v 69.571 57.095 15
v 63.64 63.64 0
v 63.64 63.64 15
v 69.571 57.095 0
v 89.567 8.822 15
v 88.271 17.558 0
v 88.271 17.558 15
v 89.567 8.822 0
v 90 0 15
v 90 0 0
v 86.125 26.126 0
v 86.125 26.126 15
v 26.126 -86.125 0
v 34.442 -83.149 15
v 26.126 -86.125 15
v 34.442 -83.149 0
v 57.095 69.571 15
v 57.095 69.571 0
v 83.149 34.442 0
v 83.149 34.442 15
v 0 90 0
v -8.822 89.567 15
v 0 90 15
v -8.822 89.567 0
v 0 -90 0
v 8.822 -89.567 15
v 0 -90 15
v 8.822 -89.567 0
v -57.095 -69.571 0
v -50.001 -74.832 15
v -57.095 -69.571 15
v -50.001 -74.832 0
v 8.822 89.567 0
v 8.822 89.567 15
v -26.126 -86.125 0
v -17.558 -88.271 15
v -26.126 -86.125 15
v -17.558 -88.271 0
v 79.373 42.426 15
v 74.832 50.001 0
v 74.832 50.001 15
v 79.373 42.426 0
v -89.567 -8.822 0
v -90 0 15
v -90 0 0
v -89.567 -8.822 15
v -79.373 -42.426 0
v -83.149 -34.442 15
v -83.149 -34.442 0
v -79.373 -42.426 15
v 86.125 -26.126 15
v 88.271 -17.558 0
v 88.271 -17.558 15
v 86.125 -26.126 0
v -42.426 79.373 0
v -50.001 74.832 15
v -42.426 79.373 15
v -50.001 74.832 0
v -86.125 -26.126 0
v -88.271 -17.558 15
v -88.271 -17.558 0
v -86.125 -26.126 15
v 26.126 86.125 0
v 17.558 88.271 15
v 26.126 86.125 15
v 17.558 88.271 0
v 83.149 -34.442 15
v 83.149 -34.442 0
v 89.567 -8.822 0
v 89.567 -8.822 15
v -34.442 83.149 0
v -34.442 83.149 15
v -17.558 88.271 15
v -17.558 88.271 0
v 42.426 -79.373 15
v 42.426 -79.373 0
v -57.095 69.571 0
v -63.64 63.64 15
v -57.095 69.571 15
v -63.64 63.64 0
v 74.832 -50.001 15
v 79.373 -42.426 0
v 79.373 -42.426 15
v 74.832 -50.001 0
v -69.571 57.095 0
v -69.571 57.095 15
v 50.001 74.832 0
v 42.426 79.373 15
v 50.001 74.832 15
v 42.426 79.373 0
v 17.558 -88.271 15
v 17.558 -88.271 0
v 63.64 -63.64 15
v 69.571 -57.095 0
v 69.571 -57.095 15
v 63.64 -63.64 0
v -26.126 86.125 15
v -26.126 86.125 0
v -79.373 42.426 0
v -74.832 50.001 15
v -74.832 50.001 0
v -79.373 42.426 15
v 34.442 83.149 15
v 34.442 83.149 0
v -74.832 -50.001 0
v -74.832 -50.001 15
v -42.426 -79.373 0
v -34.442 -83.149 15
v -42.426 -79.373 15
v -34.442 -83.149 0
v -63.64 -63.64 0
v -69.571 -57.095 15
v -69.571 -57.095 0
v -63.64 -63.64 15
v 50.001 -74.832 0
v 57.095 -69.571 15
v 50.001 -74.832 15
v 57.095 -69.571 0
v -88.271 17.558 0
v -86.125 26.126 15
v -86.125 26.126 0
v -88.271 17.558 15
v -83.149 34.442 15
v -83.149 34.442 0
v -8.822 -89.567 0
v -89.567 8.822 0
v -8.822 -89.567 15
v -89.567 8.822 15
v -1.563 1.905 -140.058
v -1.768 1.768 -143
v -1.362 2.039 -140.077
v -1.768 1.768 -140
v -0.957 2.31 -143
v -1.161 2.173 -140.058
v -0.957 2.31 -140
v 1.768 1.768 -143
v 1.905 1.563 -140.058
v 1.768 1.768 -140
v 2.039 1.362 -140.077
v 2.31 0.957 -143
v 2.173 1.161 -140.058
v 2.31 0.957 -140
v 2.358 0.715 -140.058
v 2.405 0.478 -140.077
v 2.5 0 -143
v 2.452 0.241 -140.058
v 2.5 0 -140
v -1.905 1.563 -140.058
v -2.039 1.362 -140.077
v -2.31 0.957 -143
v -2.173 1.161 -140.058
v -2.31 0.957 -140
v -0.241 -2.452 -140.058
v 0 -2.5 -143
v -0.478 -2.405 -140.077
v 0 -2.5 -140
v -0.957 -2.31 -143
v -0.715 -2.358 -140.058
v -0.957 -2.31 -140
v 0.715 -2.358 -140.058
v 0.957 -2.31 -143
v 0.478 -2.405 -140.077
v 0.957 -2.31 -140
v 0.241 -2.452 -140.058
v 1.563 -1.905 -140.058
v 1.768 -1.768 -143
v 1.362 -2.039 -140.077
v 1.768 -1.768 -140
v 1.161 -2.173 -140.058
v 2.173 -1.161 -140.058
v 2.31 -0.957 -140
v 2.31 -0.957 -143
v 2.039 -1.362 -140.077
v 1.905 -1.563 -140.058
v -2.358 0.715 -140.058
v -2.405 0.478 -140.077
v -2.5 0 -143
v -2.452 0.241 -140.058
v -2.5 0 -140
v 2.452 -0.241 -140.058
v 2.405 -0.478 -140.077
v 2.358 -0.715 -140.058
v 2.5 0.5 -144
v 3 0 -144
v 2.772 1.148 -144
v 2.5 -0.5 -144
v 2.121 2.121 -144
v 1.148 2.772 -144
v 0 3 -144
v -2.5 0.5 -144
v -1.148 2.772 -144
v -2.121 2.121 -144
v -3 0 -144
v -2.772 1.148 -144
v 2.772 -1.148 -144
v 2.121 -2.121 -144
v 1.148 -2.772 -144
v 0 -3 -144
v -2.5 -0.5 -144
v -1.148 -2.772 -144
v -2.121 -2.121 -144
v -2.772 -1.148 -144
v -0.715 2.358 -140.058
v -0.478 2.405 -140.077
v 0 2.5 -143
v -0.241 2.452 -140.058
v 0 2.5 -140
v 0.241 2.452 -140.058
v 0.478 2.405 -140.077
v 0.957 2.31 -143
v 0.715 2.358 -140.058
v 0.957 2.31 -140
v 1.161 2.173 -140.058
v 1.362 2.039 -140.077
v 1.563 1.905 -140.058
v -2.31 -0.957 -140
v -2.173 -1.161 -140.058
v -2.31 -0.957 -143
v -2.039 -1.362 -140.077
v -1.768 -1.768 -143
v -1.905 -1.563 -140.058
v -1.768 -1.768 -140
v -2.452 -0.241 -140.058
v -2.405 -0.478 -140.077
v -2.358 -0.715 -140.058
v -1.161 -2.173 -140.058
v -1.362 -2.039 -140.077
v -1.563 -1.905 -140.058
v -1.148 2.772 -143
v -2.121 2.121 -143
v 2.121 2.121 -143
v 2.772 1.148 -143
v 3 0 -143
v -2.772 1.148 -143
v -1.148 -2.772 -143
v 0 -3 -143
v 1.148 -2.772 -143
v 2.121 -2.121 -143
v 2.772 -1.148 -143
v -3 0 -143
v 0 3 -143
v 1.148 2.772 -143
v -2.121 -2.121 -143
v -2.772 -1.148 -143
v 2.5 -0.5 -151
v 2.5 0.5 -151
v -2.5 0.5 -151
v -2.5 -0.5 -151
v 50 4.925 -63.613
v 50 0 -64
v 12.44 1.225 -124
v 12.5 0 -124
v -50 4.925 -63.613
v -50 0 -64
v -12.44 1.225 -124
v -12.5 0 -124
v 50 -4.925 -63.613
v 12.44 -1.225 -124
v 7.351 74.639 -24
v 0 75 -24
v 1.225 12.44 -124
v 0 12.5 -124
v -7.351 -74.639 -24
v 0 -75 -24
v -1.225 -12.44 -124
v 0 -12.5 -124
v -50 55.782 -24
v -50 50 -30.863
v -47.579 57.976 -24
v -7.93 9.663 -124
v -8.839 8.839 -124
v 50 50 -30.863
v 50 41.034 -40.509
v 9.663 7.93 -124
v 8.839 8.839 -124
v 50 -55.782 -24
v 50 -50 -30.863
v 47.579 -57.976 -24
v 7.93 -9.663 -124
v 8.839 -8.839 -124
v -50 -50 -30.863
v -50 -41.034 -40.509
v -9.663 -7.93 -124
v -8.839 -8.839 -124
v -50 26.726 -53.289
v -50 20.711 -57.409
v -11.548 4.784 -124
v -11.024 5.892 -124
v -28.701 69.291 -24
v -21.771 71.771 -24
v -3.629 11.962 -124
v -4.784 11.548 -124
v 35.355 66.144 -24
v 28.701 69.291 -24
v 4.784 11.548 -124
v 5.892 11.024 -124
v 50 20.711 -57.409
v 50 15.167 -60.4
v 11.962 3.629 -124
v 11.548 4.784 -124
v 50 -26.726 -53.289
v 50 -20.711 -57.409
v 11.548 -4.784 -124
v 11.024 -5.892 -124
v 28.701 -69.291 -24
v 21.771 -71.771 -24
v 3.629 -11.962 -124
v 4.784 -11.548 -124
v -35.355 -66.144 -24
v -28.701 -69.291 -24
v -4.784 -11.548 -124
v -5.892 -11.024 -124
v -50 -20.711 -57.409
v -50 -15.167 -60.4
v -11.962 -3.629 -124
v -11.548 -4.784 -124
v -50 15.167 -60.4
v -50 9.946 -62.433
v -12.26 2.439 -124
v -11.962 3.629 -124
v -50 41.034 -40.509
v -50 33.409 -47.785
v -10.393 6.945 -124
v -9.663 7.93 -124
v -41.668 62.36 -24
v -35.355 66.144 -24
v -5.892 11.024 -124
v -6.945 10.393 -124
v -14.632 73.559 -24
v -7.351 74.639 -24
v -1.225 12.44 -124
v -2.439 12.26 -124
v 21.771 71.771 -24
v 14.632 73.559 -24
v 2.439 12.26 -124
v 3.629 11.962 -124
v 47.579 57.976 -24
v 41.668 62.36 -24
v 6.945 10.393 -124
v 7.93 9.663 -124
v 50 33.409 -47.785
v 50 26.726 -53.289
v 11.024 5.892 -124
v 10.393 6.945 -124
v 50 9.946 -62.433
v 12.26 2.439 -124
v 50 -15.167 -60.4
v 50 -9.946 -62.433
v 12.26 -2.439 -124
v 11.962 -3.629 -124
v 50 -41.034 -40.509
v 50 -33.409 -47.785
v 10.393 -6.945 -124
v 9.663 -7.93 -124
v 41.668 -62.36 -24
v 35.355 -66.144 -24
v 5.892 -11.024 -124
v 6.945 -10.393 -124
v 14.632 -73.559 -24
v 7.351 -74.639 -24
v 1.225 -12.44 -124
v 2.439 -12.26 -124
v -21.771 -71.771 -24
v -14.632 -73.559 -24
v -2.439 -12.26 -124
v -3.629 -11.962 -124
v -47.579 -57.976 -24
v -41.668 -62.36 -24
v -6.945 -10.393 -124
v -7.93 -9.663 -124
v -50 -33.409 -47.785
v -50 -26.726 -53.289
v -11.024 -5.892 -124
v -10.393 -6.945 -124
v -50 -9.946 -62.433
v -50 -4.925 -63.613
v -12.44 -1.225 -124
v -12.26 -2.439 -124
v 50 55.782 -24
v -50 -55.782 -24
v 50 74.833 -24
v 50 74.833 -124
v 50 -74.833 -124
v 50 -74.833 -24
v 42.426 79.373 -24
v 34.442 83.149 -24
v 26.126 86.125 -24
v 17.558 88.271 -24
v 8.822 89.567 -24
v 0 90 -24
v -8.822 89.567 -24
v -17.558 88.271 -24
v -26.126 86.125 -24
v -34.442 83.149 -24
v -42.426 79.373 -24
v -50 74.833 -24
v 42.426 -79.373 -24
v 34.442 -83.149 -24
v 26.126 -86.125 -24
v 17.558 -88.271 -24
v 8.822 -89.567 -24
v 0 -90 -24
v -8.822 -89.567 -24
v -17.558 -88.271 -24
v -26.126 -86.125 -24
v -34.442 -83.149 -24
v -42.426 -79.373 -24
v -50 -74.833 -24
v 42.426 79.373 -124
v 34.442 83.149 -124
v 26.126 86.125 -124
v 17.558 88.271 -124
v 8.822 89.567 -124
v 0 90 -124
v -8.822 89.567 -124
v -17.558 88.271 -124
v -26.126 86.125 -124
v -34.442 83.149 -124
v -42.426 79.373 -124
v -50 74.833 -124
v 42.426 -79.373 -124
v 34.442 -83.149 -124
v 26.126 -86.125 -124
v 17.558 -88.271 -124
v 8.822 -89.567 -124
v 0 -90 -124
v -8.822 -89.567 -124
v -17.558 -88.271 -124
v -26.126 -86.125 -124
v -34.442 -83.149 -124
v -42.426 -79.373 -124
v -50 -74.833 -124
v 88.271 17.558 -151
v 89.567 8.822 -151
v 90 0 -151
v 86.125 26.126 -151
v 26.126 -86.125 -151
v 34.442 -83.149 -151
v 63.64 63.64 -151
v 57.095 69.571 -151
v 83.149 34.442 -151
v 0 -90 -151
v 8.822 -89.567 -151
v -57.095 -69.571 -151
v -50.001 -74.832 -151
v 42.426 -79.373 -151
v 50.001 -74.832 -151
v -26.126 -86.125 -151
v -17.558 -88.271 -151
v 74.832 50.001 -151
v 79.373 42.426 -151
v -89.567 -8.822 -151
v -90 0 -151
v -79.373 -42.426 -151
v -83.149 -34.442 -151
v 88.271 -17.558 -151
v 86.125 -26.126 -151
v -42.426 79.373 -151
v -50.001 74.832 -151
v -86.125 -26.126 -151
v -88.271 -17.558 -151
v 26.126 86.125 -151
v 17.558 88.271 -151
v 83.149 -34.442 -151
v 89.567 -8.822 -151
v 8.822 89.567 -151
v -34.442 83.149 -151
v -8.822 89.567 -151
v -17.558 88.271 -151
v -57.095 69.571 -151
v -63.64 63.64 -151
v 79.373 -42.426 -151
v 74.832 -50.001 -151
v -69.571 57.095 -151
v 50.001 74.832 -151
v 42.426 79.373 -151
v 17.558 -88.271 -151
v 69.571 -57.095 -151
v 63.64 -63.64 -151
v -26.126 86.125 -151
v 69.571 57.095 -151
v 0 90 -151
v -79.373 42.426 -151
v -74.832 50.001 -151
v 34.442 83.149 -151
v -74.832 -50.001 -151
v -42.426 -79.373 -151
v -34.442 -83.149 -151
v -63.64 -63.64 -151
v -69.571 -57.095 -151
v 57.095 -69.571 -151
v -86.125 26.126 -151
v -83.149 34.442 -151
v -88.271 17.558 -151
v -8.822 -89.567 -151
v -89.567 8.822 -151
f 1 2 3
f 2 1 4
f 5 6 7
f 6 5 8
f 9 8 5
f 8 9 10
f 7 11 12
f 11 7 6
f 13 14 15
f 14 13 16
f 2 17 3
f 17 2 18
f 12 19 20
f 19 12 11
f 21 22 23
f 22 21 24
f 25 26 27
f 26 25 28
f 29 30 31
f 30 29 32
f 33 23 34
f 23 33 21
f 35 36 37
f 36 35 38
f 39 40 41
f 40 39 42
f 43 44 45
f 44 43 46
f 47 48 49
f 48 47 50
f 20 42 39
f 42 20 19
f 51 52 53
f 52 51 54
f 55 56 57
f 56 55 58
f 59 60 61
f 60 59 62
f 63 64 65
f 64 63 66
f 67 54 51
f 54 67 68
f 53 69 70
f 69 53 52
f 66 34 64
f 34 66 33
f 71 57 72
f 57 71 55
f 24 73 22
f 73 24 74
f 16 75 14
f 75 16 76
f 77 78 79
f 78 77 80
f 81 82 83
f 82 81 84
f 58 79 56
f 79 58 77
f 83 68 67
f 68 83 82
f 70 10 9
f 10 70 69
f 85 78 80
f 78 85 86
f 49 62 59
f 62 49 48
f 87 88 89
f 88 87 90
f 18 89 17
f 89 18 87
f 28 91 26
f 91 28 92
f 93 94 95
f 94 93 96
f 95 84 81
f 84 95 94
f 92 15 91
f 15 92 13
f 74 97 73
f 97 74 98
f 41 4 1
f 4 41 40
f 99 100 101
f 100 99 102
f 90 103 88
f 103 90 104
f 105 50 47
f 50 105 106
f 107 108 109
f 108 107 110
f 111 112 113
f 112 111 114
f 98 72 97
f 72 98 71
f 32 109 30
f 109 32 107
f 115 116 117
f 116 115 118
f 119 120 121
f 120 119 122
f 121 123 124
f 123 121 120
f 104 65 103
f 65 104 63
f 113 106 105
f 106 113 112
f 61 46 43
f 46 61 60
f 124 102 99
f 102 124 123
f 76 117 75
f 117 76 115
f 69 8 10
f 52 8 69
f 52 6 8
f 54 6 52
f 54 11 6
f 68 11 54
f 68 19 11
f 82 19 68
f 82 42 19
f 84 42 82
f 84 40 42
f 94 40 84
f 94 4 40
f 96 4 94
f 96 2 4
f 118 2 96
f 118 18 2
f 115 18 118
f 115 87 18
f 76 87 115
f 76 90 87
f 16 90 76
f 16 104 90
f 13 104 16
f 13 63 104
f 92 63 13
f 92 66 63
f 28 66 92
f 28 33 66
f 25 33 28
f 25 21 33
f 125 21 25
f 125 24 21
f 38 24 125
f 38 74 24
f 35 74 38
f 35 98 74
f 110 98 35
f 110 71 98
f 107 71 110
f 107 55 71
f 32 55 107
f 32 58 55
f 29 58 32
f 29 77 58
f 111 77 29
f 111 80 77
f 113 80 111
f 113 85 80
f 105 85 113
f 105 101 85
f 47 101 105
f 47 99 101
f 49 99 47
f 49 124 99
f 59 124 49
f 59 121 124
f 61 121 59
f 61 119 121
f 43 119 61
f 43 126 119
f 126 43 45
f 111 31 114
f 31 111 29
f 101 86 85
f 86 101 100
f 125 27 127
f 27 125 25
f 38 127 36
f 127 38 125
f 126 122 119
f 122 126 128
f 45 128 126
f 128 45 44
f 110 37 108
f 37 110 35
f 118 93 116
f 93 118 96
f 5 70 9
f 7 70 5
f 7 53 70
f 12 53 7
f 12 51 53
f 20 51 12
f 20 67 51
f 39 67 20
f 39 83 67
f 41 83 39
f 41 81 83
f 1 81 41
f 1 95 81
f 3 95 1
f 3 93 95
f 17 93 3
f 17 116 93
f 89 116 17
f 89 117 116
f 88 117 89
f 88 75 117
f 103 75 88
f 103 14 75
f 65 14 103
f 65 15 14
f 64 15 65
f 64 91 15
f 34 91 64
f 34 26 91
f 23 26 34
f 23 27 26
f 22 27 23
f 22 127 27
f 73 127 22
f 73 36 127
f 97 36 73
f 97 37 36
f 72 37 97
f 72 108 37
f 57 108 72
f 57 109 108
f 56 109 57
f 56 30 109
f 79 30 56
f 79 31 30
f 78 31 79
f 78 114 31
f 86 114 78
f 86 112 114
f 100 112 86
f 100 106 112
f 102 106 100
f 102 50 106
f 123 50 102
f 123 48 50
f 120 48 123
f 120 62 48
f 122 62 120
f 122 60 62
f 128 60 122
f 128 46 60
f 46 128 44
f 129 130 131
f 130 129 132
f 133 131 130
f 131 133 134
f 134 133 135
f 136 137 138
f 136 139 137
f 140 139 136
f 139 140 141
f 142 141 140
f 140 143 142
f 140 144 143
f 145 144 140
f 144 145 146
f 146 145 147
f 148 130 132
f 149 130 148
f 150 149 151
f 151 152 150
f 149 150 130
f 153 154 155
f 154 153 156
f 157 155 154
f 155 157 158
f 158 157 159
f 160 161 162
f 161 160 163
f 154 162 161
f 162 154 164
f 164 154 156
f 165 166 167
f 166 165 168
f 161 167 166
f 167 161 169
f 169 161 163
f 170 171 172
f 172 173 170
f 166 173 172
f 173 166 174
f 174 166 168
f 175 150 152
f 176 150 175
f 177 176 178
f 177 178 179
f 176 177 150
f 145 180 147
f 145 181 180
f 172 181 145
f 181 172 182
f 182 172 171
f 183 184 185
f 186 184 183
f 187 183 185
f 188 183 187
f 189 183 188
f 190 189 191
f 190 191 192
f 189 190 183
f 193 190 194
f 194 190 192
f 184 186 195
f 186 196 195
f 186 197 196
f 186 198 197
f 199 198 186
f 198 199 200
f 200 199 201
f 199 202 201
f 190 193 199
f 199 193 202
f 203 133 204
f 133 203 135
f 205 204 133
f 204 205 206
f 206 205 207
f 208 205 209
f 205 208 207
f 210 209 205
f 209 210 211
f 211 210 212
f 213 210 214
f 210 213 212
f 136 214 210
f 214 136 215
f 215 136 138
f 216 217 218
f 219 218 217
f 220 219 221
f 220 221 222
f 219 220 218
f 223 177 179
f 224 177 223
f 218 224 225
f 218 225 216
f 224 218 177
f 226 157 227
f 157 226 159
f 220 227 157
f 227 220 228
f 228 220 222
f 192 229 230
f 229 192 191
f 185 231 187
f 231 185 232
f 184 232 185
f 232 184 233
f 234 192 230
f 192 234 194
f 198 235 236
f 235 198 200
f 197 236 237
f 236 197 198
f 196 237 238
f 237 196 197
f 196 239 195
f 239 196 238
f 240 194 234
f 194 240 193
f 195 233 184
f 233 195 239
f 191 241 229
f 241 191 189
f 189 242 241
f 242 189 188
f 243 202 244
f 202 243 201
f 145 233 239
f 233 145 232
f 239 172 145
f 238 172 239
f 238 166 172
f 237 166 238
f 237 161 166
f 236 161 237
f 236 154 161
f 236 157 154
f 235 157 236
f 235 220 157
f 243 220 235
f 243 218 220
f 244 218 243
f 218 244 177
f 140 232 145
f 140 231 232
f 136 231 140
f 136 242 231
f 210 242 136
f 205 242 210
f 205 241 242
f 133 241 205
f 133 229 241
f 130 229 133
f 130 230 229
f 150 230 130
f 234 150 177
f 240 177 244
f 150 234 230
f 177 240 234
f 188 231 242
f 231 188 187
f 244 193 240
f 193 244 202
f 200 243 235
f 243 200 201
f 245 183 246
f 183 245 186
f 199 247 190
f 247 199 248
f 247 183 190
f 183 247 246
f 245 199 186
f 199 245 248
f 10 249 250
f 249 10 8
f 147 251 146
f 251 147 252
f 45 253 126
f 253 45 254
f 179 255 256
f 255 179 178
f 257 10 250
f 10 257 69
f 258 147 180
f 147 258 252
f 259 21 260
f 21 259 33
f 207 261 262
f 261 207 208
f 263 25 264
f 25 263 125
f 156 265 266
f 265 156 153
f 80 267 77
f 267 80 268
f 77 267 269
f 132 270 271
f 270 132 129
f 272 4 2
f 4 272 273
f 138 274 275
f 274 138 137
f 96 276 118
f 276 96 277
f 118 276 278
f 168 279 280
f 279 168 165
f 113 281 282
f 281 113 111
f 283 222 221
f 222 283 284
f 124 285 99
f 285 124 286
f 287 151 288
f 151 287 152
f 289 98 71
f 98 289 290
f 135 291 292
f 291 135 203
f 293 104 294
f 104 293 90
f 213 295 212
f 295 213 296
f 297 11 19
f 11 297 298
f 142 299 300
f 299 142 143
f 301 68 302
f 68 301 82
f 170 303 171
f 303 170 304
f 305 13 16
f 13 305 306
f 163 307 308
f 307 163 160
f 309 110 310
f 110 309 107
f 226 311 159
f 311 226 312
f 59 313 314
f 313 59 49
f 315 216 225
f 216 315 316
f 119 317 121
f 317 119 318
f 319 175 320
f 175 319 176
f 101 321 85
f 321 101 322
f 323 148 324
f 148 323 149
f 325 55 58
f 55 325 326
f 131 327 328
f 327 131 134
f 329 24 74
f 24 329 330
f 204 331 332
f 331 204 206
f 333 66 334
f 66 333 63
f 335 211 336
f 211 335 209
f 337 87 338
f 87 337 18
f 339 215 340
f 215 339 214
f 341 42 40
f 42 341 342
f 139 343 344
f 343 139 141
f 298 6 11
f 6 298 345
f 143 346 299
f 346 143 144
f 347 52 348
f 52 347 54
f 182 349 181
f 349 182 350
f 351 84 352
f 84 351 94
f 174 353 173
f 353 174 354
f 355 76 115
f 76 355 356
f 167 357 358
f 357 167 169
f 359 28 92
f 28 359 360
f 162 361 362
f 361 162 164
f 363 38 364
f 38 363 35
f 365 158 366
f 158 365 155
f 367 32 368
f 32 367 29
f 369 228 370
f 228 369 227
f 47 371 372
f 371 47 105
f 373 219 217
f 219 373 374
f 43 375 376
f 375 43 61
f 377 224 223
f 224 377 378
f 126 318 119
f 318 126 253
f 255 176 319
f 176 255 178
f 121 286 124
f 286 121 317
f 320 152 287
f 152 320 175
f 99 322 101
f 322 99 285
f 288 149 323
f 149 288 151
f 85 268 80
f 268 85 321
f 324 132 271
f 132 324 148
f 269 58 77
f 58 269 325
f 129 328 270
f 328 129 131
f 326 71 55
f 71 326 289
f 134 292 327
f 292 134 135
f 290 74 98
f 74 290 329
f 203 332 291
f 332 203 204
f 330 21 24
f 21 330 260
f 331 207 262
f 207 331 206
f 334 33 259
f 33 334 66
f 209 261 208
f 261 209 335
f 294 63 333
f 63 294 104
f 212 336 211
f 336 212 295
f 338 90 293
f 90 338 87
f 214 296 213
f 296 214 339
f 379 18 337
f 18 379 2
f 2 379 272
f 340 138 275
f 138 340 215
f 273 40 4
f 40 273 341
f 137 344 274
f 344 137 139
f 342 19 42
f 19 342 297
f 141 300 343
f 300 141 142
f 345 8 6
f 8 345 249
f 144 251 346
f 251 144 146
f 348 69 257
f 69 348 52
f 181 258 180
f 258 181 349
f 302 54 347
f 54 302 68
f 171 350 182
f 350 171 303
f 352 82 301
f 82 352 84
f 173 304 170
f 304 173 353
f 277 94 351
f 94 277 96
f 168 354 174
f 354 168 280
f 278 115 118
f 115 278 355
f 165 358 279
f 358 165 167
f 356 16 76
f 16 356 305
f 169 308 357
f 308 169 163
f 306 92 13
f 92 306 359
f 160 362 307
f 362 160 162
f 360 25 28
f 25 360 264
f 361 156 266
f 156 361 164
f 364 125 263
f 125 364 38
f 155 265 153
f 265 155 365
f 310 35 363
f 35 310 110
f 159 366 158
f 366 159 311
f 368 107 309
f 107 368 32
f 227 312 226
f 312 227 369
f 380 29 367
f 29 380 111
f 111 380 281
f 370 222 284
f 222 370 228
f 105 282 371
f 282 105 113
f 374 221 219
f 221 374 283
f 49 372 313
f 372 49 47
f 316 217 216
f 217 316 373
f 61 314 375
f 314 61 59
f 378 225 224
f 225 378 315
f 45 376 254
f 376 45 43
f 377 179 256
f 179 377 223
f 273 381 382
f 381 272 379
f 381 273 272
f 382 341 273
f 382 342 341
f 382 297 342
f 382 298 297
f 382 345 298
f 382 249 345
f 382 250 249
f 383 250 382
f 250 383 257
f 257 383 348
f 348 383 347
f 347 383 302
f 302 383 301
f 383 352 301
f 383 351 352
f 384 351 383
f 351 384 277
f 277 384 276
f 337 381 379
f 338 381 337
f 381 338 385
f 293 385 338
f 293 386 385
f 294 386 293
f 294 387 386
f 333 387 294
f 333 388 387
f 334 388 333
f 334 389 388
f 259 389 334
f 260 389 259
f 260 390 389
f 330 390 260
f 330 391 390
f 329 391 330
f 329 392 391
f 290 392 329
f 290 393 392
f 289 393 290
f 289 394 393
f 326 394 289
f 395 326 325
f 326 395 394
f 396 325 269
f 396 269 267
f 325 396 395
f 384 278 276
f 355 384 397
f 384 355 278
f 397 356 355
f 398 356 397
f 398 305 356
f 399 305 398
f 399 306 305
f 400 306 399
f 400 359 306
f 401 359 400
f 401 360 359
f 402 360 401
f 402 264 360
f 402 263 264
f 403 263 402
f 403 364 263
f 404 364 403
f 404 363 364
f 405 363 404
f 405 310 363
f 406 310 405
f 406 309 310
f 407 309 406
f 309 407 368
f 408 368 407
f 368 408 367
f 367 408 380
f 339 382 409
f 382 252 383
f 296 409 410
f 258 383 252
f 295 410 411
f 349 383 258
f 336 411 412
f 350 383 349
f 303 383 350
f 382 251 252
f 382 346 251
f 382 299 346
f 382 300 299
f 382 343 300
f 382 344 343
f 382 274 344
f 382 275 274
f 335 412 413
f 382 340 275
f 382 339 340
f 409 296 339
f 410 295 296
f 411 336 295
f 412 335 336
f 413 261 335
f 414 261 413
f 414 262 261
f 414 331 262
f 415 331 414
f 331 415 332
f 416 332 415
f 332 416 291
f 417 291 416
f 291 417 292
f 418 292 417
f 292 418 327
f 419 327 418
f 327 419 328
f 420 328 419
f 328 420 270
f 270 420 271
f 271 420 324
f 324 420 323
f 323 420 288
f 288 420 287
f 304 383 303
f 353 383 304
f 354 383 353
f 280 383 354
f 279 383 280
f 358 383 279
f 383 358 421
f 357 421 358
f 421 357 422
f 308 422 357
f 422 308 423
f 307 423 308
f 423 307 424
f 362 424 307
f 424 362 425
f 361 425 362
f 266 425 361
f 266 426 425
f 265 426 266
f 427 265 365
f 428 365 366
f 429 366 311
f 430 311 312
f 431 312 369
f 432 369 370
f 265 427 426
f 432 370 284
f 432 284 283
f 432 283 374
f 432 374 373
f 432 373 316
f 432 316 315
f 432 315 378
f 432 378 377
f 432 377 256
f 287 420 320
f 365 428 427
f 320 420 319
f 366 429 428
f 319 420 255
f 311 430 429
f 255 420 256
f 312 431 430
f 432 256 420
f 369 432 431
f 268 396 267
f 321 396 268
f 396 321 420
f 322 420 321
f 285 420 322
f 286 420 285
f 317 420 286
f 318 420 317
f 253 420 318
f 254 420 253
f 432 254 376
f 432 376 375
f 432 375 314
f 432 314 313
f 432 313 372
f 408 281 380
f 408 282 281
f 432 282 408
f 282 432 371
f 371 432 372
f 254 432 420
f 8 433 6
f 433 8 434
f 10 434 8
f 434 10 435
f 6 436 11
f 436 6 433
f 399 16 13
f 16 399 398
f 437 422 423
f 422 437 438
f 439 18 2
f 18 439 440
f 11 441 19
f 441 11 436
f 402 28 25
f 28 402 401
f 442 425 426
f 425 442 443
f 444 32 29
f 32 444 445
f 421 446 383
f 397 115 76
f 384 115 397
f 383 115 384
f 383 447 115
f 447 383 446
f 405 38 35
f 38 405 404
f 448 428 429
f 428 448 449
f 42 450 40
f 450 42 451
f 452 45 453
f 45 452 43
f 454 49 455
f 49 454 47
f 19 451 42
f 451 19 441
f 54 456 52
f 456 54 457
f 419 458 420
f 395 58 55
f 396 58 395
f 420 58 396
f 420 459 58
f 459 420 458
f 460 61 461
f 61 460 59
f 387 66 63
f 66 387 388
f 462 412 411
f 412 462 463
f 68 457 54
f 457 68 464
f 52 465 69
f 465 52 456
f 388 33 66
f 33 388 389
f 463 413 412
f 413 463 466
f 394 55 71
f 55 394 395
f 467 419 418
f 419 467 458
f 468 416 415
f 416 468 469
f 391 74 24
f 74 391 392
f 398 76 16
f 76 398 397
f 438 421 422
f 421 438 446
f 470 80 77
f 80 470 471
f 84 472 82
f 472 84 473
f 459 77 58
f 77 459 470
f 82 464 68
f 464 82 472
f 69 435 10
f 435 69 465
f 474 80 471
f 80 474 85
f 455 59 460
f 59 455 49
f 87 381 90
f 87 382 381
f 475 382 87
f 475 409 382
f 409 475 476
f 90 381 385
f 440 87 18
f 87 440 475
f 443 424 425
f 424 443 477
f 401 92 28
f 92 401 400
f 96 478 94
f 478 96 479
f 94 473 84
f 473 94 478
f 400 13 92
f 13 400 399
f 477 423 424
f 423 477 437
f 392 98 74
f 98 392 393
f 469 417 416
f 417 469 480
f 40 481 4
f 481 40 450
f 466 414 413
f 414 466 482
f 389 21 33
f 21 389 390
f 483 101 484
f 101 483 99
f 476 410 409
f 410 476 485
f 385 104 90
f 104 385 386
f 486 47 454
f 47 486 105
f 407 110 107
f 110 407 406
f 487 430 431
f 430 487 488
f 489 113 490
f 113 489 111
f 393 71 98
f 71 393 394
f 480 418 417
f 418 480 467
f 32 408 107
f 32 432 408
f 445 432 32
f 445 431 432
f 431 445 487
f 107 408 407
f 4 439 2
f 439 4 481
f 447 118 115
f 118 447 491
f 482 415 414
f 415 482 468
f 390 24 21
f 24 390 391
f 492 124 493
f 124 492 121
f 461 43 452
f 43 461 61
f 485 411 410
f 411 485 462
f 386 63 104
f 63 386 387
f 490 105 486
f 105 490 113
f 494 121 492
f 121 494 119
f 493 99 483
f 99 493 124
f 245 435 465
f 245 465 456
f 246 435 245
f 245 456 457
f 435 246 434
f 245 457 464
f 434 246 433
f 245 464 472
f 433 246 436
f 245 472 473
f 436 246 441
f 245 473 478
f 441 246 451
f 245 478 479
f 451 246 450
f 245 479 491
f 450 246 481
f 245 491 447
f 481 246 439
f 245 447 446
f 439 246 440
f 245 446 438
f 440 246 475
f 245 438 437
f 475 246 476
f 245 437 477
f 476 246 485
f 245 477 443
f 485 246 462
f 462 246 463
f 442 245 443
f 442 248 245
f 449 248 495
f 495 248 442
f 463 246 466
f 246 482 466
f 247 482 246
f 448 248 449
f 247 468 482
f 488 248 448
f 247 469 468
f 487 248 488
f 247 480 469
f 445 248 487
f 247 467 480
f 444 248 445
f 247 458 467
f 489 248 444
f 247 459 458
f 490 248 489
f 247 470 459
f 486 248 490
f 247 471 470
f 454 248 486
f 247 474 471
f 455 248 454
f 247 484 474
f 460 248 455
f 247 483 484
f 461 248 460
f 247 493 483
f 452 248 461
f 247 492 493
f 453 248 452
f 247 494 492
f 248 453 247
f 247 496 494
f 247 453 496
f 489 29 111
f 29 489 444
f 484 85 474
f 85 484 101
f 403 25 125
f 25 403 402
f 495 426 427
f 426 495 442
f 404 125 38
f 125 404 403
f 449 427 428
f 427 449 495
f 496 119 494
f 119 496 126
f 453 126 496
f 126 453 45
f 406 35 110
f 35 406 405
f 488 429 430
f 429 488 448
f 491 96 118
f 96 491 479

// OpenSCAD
// file: ../3d-iot-component-models/rgb-led.scad
// A RGB color LED
// Part of http://vor.space by Futurice

$fn = 16;

radius = 5/2;
height = 7;

ridge_radius = 6/2;
ridge_height = 1;

pin_length = 27;
pin_width = 1;

color("red") center();
color("blue") ridge();
color("white") lens();
color("grey") pins();

module center() {
    cylinder(r=radius, h=height);
}

module ridge() {
    cylinder(r=ridge_radius, h=ridge_height);
}

module lens() {
    translate([0, 0, height]) sphere(r=radius);
}

module pins() {
    translate([-radius, -pin_width/2, -pin_length]) cube([2*radius, pin_width, pin_length]);
}
// main file
// Vör Logo 3D Model
// Part of http://vor.space
// ©Futurice Oy, paul.houghton@futurice.com, CC-attribution-noderivatives license, http://creativecommons.org/licenses/by-nd/4.0/

$fn = 64;

logo_height = 15;
base_height = 15;
center_x = 75;
center_y = 30;
surround_radius = 90;
litho_cone_height = 1.6*surround_radius;
led_length = 7;

// Uncomment one of the following at a time
//plate_logo();
//negative_logo();
//lithophane_negative_logo(thickness=.5);
lithophane_negative_rgb_cone(thickness=.5);

module plate_logo() {
    logo_text(z=base_height);
    base();
}

module negative_logo() {
    difference() {
        base();
        logo_text();
    }
}

module lithophane_negative_logo(thickness=.5) {
    difference() {
        base();
        logo_text(z=-thickness);
    }
}

module lithophane_negative_rgb_cone(thickness=.5) {
    cut_width = 100;
    cut_height = 100;
    cut_start_height = 20;
    
    lithophane_negative_logo();
    translate([0,0,-litho_cone_height]) difference() {
        translate([0,0,-led_length]) cylinder(r=surround_radius, h=litho_cone_height+led_length);
        union() {
            cylinder(r1=0, r2=surround_radius, h=litho_cone_height);
            rgb_led();
            translate([-cut_width/2, -200, cut_start_height]) cube([cut_width, 400, cut_height]); 
        }
    }
}

module logo_text(z=0) {
    intersection() {
        translate([-center_x, -center_y, z]) linear_extrude(height = logo_height, center = false, convexity = 10) import (file = "logo_vor.dxf");
        translate([0,0,-500]) cylinder(r=surround_radius, h = 1000);
    }
}

module base() {
    cylinder(r=surround_radius, h=base_height);
}

module rgb_led() {
    include <../3d-iot-component-models/rgb-led.scad>
}
